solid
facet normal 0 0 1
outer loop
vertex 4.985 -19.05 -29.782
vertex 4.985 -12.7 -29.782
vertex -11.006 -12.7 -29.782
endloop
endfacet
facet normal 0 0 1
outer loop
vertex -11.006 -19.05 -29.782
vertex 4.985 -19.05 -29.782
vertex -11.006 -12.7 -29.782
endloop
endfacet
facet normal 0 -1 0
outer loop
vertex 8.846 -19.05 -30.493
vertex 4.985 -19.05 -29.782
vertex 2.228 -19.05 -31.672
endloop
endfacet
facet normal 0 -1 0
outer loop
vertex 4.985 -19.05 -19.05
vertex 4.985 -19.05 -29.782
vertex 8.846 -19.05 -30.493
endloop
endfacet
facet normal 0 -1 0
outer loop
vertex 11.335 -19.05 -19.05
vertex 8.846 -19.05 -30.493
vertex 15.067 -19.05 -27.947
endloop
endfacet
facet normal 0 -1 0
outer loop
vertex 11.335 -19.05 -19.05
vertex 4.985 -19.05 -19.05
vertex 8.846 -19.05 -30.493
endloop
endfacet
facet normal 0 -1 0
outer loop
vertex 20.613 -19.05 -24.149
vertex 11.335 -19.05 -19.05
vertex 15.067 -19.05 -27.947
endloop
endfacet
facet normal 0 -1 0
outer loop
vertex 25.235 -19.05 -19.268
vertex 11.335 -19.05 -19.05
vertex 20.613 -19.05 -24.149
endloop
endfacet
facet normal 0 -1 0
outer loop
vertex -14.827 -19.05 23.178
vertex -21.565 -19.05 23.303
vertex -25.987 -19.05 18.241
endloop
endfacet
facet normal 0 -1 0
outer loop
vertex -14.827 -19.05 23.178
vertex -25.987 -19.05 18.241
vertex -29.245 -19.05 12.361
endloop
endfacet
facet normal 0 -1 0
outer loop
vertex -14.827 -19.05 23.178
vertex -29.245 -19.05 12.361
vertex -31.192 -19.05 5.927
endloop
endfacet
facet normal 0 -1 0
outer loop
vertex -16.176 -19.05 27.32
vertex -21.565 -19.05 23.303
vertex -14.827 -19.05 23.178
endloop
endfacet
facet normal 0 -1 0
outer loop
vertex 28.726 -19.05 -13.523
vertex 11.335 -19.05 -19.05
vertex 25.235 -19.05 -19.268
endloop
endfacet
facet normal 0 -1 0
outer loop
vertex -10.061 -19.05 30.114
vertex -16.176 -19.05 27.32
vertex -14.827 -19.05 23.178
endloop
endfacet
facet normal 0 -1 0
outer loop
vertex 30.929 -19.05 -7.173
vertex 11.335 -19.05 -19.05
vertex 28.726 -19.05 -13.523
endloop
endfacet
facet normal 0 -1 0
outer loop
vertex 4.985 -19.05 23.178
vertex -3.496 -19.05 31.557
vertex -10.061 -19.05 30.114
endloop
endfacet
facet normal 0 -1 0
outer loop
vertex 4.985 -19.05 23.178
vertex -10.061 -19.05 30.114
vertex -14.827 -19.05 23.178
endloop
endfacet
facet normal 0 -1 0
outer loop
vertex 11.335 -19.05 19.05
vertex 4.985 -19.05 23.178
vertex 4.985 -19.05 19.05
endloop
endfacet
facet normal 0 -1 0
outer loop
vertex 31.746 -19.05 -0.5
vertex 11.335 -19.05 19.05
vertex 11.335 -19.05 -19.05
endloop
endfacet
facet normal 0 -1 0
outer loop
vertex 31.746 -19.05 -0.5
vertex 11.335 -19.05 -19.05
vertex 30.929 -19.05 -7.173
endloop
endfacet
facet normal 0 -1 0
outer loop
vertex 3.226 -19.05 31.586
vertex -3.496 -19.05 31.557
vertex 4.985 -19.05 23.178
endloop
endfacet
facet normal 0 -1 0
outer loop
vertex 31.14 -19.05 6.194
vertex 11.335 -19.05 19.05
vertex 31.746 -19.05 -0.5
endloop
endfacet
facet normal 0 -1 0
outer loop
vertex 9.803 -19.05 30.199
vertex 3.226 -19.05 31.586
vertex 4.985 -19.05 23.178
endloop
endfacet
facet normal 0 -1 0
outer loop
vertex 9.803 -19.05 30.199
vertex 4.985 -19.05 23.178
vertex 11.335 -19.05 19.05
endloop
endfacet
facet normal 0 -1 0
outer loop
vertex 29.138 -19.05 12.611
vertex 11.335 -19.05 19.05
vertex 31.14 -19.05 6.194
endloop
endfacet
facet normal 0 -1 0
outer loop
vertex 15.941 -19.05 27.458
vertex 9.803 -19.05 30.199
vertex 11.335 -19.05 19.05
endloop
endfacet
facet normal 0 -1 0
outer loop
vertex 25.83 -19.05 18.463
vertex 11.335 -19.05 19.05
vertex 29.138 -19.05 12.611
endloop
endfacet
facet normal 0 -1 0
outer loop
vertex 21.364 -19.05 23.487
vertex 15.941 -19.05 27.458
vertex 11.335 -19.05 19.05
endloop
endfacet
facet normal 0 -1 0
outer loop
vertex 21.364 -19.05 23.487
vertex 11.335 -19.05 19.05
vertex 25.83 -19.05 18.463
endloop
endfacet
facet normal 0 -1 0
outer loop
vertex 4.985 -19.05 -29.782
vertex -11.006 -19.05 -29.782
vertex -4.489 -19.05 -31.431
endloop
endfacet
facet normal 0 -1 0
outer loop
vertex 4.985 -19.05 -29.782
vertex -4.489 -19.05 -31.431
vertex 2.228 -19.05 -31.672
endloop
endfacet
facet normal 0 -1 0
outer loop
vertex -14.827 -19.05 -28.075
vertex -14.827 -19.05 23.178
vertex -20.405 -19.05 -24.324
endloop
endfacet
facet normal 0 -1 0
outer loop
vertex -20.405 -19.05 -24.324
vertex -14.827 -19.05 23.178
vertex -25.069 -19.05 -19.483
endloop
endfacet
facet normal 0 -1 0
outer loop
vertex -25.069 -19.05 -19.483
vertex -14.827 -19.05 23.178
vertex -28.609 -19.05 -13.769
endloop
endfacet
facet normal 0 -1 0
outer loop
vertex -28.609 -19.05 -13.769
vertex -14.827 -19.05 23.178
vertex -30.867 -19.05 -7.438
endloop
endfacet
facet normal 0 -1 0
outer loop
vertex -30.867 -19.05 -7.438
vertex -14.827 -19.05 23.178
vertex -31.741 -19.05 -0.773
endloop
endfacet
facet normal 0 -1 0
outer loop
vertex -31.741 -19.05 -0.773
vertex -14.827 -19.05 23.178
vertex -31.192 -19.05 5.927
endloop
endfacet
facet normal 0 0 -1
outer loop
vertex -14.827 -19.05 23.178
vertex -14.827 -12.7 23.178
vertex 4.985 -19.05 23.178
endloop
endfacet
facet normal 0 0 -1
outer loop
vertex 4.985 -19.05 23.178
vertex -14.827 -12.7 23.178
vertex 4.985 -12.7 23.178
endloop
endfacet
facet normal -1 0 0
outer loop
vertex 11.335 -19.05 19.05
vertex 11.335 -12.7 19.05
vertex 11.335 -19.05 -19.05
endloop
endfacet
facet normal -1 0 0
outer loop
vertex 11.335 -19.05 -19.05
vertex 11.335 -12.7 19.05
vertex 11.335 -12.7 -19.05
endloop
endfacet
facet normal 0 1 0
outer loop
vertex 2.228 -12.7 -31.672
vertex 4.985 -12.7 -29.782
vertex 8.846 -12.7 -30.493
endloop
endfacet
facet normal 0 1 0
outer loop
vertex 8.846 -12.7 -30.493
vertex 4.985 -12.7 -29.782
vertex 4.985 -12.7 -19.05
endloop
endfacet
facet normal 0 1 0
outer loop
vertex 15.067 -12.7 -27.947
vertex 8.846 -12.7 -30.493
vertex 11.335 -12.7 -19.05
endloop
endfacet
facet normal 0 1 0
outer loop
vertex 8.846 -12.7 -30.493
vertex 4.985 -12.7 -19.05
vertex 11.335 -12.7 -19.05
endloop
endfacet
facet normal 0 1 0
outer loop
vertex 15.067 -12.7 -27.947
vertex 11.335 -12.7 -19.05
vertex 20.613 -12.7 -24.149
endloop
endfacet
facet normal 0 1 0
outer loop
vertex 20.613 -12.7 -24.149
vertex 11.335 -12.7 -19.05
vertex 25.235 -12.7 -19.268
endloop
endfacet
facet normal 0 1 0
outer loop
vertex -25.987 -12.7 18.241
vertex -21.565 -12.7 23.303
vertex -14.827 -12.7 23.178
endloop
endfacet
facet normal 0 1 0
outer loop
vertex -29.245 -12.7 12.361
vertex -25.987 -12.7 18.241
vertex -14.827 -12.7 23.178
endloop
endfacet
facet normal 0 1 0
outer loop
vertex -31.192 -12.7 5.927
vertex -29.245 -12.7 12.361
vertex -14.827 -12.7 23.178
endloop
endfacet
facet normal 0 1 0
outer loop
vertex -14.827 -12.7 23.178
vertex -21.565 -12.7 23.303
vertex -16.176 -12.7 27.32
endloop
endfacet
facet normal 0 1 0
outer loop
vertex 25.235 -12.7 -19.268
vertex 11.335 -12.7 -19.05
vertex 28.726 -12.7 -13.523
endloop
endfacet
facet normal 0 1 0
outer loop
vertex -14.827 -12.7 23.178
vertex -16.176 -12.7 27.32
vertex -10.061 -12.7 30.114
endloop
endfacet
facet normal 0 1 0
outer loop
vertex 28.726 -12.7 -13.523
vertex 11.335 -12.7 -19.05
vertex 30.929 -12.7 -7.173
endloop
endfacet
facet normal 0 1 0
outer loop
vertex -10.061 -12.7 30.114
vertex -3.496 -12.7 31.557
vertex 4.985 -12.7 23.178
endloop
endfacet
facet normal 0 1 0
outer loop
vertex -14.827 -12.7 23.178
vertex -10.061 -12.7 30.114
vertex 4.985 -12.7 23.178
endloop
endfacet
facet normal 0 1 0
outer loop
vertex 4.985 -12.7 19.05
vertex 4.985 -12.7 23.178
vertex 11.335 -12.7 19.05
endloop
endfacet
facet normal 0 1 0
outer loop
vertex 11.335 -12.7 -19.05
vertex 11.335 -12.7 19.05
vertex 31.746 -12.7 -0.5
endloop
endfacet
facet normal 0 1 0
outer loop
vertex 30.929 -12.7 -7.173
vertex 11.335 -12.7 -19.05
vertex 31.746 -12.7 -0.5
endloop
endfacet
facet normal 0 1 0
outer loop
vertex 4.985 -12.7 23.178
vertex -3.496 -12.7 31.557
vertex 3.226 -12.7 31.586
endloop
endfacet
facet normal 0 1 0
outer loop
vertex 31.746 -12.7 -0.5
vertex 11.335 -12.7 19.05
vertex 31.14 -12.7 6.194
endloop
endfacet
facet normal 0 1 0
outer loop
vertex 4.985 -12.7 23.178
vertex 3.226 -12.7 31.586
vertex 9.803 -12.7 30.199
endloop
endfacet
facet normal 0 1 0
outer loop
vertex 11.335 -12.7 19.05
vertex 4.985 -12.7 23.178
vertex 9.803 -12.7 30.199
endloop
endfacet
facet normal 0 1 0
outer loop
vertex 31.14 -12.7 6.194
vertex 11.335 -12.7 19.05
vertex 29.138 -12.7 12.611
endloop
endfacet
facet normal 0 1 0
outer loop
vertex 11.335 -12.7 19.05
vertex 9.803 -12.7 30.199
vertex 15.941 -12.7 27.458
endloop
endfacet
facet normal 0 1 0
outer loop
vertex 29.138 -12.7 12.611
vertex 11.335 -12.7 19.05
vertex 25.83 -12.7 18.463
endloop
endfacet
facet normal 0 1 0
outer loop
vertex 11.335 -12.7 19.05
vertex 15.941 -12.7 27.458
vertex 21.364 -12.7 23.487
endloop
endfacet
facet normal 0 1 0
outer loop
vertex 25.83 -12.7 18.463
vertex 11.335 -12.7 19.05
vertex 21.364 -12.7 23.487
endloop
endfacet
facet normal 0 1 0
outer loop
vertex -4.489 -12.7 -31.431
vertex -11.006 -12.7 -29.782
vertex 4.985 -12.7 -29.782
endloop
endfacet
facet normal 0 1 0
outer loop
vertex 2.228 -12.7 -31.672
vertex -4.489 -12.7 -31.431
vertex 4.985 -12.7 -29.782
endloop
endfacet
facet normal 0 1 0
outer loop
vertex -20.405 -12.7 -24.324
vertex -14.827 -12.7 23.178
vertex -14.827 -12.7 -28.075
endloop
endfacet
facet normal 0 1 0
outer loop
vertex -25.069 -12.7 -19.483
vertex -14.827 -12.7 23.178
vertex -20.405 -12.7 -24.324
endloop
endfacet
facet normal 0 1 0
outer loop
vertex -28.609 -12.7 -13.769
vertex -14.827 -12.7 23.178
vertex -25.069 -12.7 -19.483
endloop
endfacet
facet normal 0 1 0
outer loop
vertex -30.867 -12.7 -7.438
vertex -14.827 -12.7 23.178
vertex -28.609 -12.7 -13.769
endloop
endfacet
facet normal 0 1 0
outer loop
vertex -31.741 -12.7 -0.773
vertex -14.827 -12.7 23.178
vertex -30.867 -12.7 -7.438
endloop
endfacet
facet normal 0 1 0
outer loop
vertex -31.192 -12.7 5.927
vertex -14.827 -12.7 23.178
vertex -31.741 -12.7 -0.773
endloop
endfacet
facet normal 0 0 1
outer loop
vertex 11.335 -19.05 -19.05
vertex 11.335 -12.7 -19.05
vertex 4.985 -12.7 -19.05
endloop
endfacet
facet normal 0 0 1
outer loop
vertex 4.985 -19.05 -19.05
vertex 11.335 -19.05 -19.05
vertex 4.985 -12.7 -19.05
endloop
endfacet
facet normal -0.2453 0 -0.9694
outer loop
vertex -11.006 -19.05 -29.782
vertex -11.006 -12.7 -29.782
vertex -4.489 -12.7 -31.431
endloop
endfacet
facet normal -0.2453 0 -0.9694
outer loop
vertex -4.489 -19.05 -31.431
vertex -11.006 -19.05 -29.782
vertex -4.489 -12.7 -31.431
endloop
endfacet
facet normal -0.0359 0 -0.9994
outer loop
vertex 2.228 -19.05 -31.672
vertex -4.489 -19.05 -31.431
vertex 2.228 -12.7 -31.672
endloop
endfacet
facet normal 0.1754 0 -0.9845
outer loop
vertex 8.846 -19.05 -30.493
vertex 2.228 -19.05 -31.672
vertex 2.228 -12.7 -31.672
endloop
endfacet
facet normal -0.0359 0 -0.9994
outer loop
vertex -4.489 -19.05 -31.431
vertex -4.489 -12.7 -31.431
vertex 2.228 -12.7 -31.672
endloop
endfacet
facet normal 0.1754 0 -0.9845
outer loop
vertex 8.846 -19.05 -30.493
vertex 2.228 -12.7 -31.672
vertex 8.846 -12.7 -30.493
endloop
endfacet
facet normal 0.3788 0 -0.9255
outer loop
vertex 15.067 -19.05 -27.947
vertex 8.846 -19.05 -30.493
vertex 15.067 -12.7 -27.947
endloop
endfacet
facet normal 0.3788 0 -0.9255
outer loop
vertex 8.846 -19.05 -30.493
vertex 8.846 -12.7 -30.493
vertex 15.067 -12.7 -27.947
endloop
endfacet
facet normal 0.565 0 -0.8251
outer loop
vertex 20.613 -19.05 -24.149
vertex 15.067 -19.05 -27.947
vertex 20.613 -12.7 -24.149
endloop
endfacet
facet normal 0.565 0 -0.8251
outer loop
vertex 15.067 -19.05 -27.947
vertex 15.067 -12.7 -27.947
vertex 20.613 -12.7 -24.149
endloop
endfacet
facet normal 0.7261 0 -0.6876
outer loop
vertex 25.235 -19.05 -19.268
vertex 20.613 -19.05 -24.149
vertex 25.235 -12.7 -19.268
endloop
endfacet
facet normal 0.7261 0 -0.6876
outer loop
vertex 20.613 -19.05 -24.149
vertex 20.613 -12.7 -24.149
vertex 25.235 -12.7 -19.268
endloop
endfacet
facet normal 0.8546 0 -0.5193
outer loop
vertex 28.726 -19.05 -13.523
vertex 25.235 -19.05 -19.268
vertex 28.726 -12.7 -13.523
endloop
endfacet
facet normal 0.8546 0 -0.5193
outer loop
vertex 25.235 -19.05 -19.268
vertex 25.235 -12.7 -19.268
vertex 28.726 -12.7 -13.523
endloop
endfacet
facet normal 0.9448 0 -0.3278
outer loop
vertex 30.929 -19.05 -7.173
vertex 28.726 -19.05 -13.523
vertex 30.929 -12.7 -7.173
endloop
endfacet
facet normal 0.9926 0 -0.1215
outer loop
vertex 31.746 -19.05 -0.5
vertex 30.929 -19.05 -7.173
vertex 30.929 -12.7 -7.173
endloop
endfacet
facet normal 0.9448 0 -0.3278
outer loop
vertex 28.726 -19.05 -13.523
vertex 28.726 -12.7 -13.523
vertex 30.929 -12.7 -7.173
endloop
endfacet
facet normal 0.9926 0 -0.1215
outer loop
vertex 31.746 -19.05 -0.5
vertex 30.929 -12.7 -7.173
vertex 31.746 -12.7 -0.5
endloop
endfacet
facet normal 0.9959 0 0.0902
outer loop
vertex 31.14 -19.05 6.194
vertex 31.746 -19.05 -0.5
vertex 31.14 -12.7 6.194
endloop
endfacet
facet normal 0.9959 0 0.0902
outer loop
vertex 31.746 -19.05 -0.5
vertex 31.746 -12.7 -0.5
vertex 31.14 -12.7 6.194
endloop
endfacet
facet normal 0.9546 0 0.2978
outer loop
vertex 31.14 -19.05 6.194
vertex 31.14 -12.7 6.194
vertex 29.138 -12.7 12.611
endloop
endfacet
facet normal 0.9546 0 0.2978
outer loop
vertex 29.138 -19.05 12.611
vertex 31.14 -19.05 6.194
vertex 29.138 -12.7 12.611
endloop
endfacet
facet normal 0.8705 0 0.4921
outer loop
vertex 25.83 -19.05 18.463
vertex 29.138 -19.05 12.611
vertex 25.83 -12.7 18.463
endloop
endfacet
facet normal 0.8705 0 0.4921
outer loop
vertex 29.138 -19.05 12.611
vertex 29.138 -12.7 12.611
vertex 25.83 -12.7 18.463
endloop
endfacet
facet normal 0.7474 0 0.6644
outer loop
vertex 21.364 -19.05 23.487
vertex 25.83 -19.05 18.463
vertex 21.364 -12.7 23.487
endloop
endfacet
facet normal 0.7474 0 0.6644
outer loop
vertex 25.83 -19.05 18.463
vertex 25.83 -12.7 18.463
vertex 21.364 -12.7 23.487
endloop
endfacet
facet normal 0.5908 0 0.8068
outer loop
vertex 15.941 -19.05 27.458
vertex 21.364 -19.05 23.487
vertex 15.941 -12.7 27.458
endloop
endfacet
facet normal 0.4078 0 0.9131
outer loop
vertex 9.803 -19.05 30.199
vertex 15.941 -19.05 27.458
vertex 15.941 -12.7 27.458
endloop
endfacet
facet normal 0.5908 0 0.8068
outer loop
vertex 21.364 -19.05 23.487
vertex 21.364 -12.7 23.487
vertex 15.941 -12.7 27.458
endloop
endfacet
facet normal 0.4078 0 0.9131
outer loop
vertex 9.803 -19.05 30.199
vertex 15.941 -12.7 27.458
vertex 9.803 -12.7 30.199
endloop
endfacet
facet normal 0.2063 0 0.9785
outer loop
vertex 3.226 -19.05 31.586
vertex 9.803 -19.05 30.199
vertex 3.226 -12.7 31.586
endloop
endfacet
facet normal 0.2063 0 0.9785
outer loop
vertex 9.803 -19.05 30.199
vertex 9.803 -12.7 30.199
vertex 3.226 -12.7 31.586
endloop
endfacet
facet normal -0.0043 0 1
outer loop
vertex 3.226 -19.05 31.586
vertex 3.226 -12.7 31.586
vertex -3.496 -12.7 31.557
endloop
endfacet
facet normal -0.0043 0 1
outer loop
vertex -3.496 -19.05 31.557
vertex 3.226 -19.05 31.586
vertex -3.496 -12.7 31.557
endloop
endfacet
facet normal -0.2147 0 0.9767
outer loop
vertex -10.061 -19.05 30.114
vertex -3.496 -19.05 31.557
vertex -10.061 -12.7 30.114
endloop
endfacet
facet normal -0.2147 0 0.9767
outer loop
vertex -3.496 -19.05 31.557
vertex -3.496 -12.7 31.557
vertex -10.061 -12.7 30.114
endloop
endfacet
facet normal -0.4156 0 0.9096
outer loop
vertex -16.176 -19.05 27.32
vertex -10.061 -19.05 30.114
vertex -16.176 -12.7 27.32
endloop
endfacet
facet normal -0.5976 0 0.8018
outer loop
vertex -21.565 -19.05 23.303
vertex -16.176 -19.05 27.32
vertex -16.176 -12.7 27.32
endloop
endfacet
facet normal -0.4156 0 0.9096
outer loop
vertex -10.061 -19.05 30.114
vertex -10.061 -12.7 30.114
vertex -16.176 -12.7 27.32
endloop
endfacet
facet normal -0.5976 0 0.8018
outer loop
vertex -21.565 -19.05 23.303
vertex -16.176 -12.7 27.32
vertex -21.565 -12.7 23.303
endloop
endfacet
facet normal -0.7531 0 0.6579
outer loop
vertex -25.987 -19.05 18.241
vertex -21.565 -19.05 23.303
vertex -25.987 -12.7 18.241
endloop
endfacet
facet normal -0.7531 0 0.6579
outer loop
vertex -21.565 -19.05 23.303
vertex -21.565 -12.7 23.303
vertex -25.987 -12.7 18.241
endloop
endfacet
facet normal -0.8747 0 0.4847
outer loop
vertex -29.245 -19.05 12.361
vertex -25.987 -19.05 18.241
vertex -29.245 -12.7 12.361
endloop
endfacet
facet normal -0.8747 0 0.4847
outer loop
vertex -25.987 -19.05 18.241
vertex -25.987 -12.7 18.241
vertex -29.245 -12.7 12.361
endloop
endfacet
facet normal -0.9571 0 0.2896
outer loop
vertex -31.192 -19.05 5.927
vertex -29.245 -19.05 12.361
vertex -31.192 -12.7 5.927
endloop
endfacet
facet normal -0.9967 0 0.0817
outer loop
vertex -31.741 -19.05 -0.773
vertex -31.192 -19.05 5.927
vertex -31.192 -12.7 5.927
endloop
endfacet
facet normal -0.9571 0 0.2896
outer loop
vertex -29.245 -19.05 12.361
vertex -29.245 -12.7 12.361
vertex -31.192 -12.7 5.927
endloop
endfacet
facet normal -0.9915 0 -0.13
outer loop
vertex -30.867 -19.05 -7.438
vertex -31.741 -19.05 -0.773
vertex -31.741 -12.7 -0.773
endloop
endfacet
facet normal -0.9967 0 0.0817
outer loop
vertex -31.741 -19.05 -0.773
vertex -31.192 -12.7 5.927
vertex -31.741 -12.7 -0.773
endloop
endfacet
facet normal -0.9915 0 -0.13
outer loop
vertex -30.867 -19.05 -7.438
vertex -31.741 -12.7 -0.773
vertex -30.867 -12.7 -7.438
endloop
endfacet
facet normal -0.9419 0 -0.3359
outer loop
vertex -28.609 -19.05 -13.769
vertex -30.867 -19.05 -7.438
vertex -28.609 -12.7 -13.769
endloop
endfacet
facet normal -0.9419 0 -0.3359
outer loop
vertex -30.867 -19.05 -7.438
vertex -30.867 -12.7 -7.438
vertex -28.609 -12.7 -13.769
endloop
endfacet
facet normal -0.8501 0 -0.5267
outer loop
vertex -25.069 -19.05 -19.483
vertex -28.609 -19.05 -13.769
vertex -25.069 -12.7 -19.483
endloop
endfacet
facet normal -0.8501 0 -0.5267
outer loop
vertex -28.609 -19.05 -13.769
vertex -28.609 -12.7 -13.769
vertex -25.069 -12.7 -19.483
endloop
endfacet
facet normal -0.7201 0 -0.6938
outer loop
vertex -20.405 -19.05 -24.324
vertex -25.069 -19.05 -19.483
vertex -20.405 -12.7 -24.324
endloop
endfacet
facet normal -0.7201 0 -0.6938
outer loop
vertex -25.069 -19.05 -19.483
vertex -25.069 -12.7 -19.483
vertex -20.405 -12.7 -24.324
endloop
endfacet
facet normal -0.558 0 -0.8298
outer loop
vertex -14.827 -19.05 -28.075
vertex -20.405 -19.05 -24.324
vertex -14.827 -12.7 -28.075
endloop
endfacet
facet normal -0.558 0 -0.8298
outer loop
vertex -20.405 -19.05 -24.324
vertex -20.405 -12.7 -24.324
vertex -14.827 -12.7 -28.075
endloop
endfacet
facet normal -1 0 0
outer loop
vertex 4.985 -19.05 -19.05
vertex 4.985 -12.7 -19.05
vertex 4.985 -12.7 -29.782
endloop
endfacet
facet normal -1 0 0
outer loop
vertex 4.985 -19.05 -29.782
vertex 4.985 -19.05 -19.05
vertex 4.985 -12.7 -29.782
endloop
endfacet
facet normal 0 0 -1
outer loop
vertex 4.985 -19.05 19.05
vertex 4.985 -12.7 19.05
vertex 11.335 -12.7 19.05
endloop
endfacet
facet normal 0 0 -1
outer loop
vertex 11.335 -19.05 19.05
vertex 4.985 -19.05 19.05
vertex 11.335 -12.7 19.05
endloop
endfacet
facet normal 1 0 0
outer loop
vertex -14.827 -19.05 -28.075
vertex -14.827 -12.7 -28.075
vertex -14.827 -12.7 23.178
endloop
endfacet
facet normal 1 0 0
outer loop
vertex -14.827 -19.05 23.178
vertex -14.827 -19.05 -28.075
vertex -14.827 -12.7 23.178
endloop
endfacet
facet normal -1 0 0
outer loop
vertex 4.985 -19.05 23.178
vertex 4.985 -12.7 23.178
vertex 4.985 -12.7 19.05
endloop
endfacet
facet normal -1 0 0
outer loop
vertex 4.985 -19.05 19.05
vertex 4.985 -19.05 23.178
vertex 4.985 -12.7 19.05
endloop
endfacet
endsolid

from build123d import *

# Parameters (mm, degrees)
SKETCH1_R           = 47.625
BOSS_EXTRUDE1_DEPTH = 12.7
SKETCH2_R           = 47.625
BOSS_EXTRUDE4_DEPTH = 12.7
BOSS_EXTRUDE5_DEPTH = 4.7625
SKETCH14_W          = 19.812
SKETCH14_H          = 52.959
CUT_EXTRUDE11_DEPTH = 9.275815586
BOSS_EXTRUDE7_DEPTH = 6.35


with BuildPart() as part:
    # Sketch1 → Boss-Extrude1 (new body)
    with BuildSketch(Plane(origin=(0, 0, 0), x_dir=(1, 0, 0), z_dir=(0, 1, 0))):
        Circle(SKETCH1_R)
    extrude(amount=-BOSS_EXTRUDE1_DEPTH)

    # Sketch14 → Cut-Extrude11 (cut)
    with BuildSketch(Plane.XZ.offset(12.7)):
        with Locations((-4.92125, -3.302)):
            Rectangle(SKETCH14_W, SKETCH14_H)
    extrude(amount=-CUT_EXTRUDE11_DEPTH, mode=Mode.SUBTRACT)


with BuildPart() as body_2:
    # Sketch2 → Boss-Extrude4 (new body)
    with BuildSketch(Plane(origin=(0, 0, 0), x_dir=(1, 0, 0), z_dir=(0, 1, 0))):
        Circle(SKETCH2_R)
        with BuildLine():
            Line((30.48, 5.08), (26.035, 5.08))
            Line((26.035, 5.08), (26.035, -36.027507199))
            ThreePointArc((26.035, -36.027507199), (0, -44.45), (-26.035, -36.027507199))
            Line((-26.035, -36.027507199), (-26.035, 5.08))
            Line((-26.035, 5.08), (-30.48, 5.08))
            Line((-30.48, 5.08), (-30.48, -32.353857575))
            ThreePointArc((-30.48, -32.353857575), (-43.961440483, 6.572233308), (-19.685, 39.853522743))
            Line((-19.685, 39.853522743), (-19.685, 25.0825))
            Line((-19.685, 25.0825), (-15.24, 25.0825))
            Line((-15.24, 25.0825), (-15.24, 41.755776846))
            ThreePointArc((-15.24, 41.755776846), (0, 44.45), (15.24, 41.755776846))
            Line((15.24, 41.755776846), (15.24, 25.0825))
            Line((15.24, 25.0825), (19.685, 25.0825))
            Line((19.685, 25.0825), (19.685, 39.853522743))
            ThreePointArc((19.685, 39.853522743), (43.961440483, 6.572233308), (30.48, -32.353857575))
            Line((30.48, -32.353857575), (30.48, 5.08))
        make_face(mode=Mode.SUBTRACT)
    extrude(amount=BOSS_EXTRUDE4_DEPTH)


with BuildPart() as body_3:
    # Sketch10 → Boss-Extrude5 (new body)
    with BuildSketch(Plane(origin=(0, 0, 0), x_dir=(1, 0, 0), z_dir=(0, 1, 0))):
        with BuildLine():
            ThreePointArc((4.7625, -44.19412963), (7.475442585, -43.816894666), (10.16, -43.273281595))
            Line((10.16, -43.273281595), (10.16, 43.273281595))
            ThreePointArc((10.16, 43.273281595), (7.475442585, 43.816894666), (4.7625, 44.19412963))
            Line((4.7625, 44.19412963), (4.7625, -44.19412963))
        make_face()
    extrude(amount=BOSS_EXTRUDE5_DEPTH)


with BuildPart() as body_4:
    # Sketch18 → Boss-Extrude7 (new body)
    with BuildSketch(Plane.XZ.offset(12.7)):
        with BuildLine():
            Line((-14.82725, 23.1775), (4.98475, 23.1775))
            Line((4.98475, 23.1775), (4.98475, 19.05))
            Line((4.98475, 19.05), (11.33475, 19.05))
            Line((11.33475, 19.05), (11.33475, -19.05))
            Line((11.33475, -19.05), (4.98475, -19.05))
            Line((4.98475, -19.05), (4.98475, -29.7815))
            Line((4.98475, -29.7815), (-11.005669346, -29.7815))
            ThreePointArc((-11.005669346, -29.7815), (12.944605873, 28.991372489), (-14.82725, -28.075169767))
            Line((-14.82725, -28.075169767), (-14.82725, 23.1775))
        make_face()
    extrude(amount=BOSS_EXTRUDE7_DEPTH)


solid = body_4.part
